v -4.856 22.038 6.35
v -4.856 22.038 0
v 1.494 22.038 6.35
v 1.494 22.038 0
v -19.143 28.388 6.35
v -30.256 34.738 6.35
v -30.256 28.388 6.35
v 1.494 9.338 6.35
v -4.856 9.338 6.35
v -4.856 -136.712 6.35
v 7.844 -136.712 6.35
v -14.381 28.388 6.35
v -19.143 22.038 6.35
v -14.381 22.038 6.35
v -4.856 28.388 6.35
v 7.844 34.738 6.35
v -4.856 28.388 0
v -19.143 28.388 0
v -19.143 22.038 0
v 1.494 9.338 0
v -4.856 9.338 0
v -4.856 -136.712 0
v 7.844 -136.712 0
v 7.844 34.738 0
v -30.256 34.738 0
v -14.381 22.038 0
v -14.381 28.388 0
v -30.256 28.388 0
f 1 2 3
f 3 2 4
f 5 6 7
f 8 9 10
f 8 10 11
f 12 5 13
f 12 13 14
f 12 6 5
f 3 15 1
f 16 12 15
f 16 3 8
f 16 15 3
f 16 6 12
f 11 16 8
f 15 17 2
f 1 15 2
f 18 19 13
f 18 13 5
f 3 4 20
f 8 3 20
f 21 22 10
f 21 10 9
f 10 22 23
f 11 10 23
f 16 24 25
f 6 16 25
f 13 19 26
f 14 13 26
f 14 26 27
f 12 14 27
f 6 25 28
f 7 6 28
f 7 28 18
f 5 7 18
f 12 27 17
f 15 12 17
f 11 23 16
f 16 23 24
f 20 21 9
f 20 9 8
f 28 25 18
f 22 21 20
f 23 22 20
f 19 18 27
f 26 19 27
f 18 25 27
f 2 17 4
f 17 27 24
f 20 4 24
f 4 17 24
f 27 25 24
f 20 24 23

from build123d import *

# Parameters (mm, degrees)
F0_W     = 6.35
F0_H     = 6.35
F0_H_2   = 146.05
F0_W_2   = 4.7625
F1_DEPTH = 6.35


with BuildPart() as f1:
    # F0 (on Top) → F1 (new body)
    with BuildSketch(Plane.XY):
        Polygon((7.844118, -136.711765), (7.844118, 15.688235), (1.494118, 15.688235), (1.494118, 9.338235), (1.494118, -136.711765), align=None)
        with Locations((4.669118, 18.863235)):
            Rectangle(F0_W, F0_H)
        Polygon((1.494118, 22.038235), (7.844118, 22.038235), (7.844118, 28.388235), (-4.855882, 28.388235), (-4.855882, 22.038235), align=None)
        with Locations((-1.680882, -63.686765)):
            Rectangle(F0_W, F0_H_2)
        Polygon((-4.855882, 28.388235), (7.844118, 28.388235), (7.844118, 34.738235), (-30.255882, 34.738235), (-30.255882, 28.388235), (-19.143382, 28.388235), (-14.380882, 28.388235), align=None)
        with Locations((-16.762132, 25.213235)):
            Rectangle(F0_W_2, F0_H)
    extrude(amount=F1_DEPTH)


solid = f1.part
